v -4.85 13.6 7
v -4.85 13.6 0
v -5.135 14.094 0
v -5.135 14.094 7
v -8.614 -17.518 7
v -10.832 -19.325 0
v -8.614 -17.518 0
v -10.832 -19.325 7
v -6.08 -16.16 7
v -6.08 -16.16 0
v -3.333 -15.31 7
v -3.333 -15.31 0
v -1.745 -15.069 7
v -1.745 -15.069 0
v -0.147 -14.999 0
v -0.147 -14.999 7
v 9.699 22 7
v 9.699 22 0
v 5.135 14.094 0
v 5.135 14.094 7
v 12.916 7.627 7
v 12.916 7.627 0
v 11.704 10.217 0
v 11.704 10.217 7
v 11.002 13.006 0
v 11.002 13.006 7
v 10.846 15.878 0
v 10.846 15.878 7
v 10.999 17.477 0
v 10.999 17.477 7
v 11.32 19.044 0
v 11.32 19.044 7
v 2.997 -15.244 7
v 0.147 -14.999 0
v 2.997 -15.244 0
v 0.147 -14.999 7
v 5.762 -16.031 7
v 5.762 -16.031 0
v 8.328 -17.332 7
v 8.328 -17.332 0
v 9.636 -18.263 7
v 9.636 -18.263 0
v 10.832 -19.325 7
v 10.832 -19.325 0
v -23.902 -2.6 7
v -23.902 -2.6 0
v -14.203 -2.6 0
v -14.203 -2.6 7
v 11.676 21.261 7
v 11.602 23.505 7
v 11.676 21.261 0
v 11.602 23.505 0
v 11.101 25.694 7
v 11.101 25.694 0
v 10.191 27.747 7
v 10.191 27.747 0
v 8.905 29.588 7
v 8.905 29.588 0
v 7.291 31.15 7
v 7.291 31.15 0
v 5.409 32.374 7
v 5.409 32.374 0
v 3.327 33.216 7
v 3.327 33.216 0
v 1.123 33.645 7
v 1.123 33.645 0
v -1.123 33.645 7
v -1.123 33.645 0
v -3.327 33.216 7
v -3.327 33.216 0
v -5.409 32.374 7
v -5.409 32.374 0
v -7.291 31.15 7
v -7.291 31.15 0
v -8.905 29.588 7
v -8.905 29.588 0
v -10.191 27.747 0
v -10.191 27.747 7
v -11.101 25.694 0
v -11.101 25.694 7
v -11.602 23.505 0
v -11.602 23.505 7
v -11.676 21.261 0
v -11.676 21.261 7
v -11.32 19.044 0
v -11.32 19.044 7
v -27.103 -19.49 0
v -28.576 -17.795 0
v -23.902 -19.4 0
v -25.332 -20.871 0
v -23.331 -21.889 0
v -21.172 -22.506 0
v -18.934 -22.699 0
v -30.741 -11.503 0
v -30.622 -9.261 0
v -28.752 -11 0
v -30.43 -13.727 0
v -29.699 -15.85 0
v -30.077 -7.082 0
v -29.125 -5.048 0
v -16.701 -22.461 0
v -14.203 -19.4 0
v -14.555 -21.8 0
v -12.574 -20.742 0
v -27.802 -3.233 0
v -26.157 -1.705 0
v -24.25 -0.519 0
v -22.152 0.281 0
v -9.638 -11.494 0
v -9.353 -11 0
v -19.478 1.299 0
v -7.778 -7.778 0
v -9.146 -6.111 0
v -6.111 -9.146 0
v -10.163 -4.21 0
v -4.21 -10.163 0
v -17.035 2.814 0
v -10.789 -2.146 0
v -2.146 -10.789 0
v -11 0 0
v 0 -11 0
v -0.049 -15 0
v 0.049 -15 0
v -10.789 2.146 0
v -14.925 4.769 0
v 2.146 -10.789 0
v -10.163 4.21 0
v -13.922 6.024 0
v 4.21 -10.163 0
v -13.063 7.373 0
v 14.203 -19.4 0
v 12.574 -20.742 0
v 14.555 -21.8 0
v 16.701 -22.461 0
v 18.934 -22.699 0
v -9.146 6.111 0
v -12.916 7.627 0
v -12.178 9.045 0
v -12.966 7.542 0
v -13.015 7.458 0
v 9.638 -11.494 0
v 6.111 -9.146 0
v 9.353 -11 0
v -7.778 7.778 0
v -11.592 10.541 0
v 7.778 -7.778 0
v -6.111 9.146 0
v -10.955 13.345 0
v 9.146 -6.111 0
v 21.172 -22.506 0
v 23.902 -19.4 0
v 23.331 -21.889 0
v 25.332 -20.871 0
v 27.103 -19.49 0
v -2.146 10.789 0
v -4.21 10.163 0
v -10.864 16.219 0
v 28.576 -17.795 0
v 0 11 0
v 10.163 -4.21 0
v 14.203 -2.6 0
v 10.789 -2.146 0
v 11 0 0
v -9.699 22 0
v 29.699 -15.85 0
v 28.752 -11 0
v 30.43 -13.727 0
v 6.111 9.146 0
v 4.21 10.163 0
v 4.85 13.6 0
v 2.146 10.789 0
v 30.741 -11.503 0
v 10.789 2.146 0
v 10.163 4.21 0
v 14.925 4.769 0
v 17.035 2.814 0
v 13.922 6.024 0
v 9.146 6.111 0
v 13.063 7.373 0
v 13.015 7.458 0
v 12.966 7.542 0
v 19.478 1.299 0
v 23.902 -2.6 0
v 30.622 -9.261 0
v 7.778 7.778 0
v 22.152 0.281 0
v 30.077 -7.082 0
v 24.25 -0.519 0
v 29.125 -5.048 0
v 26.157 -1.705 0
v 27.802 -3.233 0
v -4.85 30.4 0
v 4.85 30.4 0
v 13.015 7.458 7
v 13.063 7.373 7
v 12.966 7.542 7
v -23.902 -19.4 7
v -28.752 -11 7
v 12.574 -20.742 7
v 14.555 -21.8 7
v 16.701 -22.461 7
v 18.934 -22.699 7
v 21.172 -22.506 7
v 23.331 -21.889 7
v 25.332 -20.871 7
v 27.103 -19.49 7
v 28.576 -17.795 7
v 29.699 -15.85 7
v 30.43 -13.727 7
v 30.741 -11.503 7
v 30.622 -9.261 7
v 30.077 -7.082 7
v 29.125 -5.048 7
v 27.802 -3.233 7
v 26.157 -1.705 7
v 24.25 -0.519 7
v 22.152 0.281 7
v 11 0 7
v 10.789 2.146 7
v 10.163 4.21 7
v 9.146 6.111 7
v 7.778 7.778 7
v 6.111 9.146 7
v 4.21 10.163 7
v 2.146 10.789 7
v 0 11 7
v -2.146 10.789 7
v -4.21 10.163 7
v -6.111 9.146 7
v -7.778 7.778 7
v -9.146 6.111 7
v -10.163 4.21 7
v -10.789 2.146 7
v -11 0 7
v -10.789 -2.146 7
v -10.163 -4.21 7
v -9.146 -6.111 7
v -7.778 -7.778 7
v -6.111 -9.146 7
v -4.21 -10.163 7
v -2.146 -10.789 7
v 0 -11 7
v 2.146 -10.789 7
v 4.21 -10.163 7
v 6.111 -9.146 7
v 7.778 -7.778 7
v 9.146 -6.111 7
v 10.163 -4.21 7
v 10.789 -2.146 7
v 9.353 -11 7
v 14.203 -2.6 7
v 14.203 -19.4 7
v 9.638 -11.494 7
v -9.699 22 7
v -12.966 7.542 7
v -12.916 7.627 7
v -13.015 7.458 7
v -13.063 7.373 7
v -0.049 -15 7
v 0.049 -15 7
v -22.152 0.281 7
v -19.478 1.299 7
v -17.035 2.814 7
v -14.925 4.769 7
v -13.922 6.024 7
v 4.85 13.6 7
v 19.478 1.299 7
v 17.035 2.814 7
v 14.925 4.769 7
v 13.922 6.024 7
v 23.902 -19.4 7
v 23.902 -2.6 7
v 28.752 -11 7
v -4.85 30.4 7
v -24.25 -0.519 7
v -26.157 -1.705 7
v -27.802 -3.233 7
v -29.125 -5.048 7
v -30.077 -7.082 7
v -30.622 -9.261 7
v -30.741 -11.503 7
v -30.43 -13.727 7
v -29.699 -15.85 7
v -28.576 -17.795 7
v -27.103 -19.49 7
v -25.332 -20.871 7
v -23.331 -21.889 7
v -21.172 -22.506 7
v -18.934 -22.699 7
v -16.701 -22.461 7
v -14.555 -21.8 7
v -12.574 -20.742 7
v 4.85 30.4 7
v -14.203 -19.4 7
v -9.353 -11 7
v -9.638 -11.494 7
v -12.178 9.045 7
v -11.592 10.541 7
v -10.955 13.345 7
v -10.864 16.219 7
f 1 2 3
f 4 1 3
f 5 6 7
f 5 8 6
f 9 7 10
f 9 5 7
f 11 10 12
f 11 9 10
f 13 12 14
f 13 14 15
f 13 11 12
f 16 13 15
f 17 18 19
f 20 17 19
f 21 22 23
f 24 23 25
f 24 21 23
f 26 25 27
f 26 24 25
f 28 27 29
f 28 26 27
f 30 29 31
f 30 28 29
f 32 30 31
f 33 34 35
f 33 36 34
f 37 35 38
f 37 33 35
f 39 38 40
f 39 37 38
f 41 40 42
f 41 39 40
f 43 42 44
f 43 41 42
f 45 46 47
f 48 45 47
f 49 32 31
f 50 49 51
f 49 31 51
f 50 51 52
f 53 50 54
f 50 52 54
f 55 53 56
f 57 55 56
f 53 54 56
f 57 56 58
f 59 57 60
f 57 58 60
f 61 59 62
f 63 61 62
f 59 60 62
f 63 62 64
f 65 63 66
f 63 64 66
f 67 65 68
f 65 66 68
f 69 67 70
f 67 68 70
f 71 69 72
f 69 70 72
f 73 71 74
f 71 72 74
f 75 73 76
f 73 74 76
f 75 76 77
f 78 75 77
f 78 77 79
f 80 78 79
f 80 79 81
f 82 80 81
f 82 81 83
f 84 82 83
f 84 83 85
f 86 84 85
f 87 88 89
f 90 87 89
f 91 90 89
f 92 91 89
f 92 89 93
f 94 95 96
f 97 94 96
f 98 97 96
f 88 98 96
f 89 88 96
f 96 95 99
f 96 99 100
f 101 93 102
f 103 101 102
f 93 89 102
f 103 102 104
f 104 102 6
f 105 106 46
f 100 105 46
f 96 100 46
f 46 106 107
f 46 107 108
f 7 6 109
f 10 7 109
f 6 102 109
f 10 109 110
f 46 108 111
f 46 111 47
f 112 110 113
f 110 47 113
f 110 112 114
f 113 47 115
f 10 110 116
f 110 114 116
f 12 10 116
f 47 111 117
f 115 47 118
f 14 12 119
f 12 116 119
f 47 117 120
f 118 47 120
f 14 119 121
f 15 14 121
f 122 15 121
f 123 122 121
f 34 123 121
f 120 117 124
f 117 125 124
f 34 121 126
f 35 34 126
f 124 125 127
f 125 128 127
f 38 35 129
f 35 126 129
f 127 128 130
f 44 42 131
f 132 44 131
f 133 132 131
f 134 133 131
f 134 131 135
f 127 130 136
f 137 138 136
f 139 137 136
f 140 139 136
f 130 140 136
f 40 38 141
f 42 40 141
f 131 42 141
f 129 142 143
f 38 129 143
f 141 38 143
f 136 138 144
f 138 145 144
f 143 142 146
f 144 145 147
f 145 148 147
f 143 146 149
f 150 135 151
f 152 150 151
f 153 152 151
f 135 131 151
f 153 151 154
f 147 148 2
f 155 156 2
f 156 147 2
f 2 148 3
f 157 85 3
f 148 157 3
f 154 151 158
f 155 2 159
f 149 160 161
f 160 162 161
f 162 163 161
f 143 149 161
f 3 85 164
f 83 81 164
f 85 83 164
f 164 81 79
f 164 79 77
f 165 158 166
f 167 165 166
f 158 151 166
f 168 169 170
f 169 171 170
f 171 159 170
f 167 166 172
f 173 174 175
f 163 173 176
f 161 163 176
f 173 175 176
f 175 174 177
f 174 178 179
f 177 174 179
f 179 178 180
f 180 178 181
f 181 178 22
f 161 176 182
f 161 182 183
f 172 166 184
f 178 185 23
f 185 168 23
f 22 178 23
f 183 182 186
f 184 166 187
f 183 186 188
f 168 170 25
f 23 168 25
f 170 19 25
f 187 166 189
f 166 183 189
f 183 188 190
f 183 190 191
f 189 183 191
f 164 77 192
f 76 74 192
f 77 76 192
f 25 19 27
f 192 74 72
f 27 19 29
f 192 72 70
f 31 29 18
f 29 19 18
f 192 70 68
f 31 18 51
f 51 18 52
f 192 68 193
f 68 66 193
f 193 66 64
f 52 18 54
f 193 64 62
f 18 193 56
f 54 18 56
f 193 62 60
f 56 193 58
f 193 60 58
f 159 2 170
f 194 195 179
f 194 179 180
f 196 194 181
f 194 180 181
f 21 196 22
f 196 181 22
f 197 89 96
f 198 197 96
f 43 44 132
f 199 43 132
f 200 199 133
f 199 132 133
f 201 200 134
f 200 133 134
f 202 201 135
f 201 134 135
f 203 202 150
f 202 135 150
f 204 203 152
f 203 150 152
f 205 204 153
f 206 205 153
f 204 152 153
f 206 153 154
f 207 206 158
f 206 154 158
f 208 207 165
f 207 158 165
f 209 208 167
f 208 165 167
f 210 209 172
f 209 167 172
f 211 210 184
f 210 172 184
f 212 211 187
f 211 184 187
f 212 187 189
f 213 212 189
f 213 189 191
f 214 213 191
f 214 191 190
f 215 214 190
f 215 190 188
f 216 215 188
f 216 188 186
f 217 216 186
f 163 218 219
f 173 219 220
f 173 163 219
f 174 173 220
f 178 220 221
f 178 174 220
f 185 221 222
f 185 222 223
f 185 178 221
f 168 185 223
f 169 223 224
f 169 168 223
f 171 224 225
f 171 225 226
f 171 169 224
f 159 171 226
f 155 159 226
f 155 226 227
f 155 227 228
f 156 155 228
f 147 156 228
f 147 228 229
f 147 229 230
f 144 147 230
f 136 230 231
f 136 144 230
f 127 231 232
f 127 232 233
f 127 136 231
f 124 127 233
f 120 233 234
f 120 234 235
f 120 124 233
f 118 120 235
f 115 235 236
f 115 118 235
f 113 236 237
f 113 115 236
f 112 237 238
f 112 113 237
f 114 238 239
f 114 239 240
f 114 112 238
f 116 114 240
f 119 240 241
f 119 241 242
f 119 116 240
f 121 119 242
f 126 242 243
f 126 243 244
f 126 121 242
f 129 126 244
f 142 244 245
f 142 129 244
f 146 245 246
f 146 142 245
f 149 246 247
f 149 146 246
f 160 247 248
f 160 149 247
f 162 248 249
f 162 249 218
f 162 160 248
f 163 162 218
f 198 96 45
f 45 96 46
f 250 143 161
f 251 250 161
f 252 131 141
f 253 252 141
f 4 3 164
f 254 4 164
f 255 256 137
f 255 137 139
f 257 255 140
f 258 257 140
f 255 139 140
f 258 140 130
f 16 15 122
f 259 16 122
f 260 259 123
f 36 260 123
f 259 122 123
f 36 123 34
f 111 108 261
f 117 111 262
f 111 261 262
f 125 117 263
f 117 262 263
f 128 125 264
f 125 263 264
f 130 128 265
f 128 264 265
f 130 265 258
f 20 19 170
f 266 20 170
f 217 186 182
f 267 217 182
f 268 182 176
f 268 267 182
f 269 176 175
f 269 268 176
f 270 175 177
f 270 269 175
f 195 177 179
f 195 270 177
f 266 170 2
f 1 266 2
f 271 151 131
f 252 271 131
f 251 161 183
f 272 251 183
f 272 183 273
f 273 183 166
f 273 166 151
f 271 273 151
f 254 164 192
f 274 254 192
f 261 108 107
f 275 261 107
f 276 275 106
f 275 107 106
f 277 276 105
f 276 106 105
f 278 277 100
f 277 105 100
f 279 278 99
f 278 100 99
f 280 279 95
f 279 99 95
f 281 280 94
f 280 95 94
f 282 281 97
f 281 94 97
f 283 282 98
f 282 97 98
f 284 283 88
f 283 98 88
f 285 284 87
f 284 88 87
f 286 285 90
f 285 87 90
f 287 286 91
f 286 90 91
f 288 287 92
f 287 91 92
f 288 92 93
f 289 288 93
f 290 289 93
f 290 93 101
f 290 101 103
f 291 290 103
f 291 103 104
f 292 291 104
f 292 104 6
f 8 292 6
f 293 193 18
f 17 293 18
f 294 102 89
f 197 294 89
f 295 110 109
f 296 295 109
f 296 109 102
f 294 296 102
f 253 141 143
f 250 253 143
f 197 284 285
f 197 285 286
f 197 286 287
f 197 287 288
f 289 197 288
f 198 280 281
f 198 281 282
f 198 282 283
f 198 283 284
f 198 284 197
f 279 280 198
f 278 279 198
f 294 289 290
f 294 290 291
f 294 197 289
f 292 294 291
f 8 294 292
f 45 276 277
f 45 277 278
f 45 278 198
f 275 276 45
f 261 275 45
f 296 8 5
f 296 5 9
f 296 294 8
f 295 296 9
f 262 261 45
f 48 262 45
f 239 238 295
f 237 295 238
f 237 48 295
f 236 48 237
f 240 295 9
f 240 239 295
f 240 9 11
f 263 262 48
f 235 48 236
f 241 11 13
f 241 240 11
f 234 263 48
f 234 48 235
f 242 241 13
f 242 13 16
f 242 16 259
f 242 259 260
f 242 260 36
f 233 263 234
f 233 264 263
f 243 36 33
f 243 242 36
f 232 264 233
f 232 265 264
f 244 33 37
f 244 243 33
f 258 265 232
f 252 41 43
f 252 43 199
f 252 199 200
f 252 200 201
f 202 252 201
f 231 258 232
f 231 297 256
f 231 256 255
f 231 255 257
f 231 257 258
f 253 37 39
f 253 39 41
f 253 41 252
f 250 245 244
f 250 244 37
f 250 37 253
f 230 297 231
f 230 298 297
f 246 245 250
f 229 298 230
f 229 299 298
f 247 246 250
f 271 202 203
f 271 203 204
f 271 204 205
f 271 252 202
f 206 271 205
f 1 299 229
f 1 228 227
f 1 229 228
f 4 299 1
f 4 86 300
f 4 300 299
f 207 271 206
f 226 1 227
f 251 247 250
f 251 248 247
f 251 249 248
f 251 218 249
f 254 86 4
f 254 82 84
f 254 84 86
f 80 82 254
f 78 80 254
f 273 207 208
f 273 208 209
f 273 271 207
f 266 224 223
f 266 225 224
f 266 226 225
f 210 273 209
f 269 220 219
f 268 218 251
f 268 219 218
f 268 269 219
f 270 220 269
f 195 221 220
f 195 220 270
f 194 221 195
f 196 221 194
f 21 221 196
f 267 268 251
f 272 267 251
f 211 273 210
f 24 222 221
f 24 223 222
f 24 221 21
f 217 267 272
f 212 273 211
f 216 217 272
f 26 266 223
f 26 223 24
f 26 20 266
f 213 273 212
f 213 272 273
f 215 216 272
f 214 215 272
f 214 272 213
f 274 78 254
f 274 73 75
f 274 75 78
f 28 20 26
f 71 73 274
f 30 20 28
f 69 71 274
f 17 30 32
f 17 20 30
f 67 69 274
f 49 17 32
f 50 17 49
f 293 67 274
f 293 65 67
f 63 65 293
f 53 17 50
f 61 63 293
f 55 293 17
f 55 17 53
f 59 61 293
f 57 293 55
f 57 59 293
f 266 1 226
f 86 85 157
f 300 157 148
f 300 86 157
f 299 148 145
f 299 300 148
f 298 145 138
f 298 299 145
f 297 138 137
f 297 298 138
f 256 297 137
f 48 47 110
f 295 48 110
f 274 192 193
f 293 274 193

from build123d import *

# Parameters (mm, degrees)
F0_R     = 11
F1_DEPTH = 7
F2_R     = 15


with BuildPart() as f1:
    # F0 (on Top) → F1 (new body)
    with BuildSketch(Plane.XY):
        with BuildLine():
            ThreePointArc((-14.7729482501, -2.6), (-14.9420444362, -1.3173109227), (-14.9999794627, -0.0248217267))
            ThreePointArc((-14.9999794627, -0.0248217267), (-29.1846096908, -16.8497422612), (-7.5214859773, -12.9779524076))
            ThreePointArc((-7.5214859773, -12.9779524076), (-8.6118469419, -12.2815346048), (-9.6381401749, -11.4937484734))
            Line((-9.6381401749, -11.4937484734), (-14.2028166221, -19.4))
            Line((-14.2028166221, -19.4), (-23.9023011445, -19.4))
            Line((-23.9023011445, -19.4), (-28.7520434056, -11))
            Line((-28.7520434056, -11), (-23.9023011445, -2.6))
            Line((-23.9023011445, -2.6), (-14.7729482501, -2.6))
        make_face()
        with BuildLine():
            ThreePointArc((14.9999794627, -0.0248217267), (14.9999948657, -0.0124108676), (15, 0))
            ThreePointArc((15, 0), (12.9841711765, 7.5107455595), (7.4784934854, 13.0027741343))
            ThreePointArc((7.4784934854, 13.0027741343), (6.3301974943, 13.5988455276), (5.1348080752, 14.0937484734))
            Line((5.1348080752, 14.0937484734), (4.8497422612, 13.6))
            Line((4.8497422612, 13.6), (-4.8497422612, 13.6))
            Line((-4.8497422612, 13.6), (-5.1348080752, 14.0937484734))
            ThreePointArc((-5.1348080752, 14.0937484734), (-6.3301974943, 13.5988455276), (-7.4784934854, 13.0027741343))
            ThreePointArc((-7.4784934854, 13.0027741343), (-12.9903810568, 7.5), (-14.9999794627, -0.0248217267))
            ThreePointArc((-14.9999794627, -0.0248217267), (-14.9420444362, -1.3173109227), (-14.7729482501, -2.6))
            Line((-14.7729482501, -2.6), (-14.2028166221, -2.6))
            Line((-14.2028166221, -2.6), (-9.3530743609, -11))
            Line((-9.3530743609, -11), (-9.6381401749, -11.4937484734))
            ThreePointArc((-9.6381401749, -11.4937484734), (-8.6118469419, -12.2815346048), (-7.5214859773, -12.9779524076))
            ThreePointArc((-7.5214859773, -12.9779524076), (0, -15), (7.5214859773, -12.9779524076))
            ThreePointArc((7.5214859773, -12.9779524076), (8.6118469419, -12.2815346048), (9.6381401749, -11.4937484734))
            Line((9.6381401749, -11.4937484734), (9.3530743609, -11))
            Line((9.3530743609, -11), (14.2028166221, -2.6))
            Line((14.2028166221, -2.6), (14.7729482501, -2.6))
            ThreePointArc((14.7729482501, -2.6), (14.9420444362, -1.3173109227), (14.9999794627, -0.0248217267))
        make_face()
        Circle(F0_R, mode=Mode.SUBTRACT)
        with BuildLine():
            ThreePointArc((7.5214859773, -12.9779524076), (29.1846096908, -16.8497422612), (14.9999794627, -0.0248217267))
            ThreePointArc((14.9999794627, -0.0248217267), (14.9420444362, -1.3173109227), (14.7729482501, -2.6))
            Line((14.7729482501, -2.6), (23.9023011445, -2.6))
            Line((23.9023011445, -2.6), (28.7520434056, -11))
            Line((28.7520434056, -11), (23.9023011445, -19.4))
            Line((23.9023011445, -19.4), (14.2028166221, -19.4))
            Line((14.2028166221, -19.4), (9.6381401749, -11.4937484734))
            ThreePointArc((9.6381401749, -11.4937484734), (8.6118469419, -12.2815346048), (7.5214859773, -12.9779524076))
        make_face()
        with BuildLine():
            ThreePointArc((5.1348080752, 14.0937484734), (6.3301974943, 13.5988455276), (7.4784934854, 13.0027741343))
            ThreePointArc((7.4784934854, 13.0027741343), (0, 33.6994845224), (-7.4784934854, 13.0027741343))
            ThreePointArc((-7.4784934854, 13.0027741343), (-6.3301974943, 13.5988455276), (-5.1348080752, 14.0937484734))
            Line((-5.1348080752, 14.0937484734), (-9.6994845224, 22))
            Line((-9.6994845224, 22), (-4.8497422612, 30.4))
            Line((-4.8497422612, 30.4), (4.8497422612, 30.4))
            Line((4.8497422612, 30.4), (9.6994845224, 22))
            Line((9.6994845224, 22), (5.1348080752, 14.0937484734))
        make_face()
    extrude(amount=F1_DEPTH)

    # F2
    f2_edges = [f1.edges().sort_by_distance(p)[0] for p in [
        (7.521486, -12.977952, 3.5),
        (-14.999979, -0.024822, 3.5),
        (7.478493, 13.002774, 3.5),
        (-7.521486, -12.977952, 3.5),
        (14.999979, -0.024822, 3.5),
        (-7.478493, 13.002774, 3.5),
    ]]
    fillet(f2_edges, radius=F2_R)


solid = f1.part
